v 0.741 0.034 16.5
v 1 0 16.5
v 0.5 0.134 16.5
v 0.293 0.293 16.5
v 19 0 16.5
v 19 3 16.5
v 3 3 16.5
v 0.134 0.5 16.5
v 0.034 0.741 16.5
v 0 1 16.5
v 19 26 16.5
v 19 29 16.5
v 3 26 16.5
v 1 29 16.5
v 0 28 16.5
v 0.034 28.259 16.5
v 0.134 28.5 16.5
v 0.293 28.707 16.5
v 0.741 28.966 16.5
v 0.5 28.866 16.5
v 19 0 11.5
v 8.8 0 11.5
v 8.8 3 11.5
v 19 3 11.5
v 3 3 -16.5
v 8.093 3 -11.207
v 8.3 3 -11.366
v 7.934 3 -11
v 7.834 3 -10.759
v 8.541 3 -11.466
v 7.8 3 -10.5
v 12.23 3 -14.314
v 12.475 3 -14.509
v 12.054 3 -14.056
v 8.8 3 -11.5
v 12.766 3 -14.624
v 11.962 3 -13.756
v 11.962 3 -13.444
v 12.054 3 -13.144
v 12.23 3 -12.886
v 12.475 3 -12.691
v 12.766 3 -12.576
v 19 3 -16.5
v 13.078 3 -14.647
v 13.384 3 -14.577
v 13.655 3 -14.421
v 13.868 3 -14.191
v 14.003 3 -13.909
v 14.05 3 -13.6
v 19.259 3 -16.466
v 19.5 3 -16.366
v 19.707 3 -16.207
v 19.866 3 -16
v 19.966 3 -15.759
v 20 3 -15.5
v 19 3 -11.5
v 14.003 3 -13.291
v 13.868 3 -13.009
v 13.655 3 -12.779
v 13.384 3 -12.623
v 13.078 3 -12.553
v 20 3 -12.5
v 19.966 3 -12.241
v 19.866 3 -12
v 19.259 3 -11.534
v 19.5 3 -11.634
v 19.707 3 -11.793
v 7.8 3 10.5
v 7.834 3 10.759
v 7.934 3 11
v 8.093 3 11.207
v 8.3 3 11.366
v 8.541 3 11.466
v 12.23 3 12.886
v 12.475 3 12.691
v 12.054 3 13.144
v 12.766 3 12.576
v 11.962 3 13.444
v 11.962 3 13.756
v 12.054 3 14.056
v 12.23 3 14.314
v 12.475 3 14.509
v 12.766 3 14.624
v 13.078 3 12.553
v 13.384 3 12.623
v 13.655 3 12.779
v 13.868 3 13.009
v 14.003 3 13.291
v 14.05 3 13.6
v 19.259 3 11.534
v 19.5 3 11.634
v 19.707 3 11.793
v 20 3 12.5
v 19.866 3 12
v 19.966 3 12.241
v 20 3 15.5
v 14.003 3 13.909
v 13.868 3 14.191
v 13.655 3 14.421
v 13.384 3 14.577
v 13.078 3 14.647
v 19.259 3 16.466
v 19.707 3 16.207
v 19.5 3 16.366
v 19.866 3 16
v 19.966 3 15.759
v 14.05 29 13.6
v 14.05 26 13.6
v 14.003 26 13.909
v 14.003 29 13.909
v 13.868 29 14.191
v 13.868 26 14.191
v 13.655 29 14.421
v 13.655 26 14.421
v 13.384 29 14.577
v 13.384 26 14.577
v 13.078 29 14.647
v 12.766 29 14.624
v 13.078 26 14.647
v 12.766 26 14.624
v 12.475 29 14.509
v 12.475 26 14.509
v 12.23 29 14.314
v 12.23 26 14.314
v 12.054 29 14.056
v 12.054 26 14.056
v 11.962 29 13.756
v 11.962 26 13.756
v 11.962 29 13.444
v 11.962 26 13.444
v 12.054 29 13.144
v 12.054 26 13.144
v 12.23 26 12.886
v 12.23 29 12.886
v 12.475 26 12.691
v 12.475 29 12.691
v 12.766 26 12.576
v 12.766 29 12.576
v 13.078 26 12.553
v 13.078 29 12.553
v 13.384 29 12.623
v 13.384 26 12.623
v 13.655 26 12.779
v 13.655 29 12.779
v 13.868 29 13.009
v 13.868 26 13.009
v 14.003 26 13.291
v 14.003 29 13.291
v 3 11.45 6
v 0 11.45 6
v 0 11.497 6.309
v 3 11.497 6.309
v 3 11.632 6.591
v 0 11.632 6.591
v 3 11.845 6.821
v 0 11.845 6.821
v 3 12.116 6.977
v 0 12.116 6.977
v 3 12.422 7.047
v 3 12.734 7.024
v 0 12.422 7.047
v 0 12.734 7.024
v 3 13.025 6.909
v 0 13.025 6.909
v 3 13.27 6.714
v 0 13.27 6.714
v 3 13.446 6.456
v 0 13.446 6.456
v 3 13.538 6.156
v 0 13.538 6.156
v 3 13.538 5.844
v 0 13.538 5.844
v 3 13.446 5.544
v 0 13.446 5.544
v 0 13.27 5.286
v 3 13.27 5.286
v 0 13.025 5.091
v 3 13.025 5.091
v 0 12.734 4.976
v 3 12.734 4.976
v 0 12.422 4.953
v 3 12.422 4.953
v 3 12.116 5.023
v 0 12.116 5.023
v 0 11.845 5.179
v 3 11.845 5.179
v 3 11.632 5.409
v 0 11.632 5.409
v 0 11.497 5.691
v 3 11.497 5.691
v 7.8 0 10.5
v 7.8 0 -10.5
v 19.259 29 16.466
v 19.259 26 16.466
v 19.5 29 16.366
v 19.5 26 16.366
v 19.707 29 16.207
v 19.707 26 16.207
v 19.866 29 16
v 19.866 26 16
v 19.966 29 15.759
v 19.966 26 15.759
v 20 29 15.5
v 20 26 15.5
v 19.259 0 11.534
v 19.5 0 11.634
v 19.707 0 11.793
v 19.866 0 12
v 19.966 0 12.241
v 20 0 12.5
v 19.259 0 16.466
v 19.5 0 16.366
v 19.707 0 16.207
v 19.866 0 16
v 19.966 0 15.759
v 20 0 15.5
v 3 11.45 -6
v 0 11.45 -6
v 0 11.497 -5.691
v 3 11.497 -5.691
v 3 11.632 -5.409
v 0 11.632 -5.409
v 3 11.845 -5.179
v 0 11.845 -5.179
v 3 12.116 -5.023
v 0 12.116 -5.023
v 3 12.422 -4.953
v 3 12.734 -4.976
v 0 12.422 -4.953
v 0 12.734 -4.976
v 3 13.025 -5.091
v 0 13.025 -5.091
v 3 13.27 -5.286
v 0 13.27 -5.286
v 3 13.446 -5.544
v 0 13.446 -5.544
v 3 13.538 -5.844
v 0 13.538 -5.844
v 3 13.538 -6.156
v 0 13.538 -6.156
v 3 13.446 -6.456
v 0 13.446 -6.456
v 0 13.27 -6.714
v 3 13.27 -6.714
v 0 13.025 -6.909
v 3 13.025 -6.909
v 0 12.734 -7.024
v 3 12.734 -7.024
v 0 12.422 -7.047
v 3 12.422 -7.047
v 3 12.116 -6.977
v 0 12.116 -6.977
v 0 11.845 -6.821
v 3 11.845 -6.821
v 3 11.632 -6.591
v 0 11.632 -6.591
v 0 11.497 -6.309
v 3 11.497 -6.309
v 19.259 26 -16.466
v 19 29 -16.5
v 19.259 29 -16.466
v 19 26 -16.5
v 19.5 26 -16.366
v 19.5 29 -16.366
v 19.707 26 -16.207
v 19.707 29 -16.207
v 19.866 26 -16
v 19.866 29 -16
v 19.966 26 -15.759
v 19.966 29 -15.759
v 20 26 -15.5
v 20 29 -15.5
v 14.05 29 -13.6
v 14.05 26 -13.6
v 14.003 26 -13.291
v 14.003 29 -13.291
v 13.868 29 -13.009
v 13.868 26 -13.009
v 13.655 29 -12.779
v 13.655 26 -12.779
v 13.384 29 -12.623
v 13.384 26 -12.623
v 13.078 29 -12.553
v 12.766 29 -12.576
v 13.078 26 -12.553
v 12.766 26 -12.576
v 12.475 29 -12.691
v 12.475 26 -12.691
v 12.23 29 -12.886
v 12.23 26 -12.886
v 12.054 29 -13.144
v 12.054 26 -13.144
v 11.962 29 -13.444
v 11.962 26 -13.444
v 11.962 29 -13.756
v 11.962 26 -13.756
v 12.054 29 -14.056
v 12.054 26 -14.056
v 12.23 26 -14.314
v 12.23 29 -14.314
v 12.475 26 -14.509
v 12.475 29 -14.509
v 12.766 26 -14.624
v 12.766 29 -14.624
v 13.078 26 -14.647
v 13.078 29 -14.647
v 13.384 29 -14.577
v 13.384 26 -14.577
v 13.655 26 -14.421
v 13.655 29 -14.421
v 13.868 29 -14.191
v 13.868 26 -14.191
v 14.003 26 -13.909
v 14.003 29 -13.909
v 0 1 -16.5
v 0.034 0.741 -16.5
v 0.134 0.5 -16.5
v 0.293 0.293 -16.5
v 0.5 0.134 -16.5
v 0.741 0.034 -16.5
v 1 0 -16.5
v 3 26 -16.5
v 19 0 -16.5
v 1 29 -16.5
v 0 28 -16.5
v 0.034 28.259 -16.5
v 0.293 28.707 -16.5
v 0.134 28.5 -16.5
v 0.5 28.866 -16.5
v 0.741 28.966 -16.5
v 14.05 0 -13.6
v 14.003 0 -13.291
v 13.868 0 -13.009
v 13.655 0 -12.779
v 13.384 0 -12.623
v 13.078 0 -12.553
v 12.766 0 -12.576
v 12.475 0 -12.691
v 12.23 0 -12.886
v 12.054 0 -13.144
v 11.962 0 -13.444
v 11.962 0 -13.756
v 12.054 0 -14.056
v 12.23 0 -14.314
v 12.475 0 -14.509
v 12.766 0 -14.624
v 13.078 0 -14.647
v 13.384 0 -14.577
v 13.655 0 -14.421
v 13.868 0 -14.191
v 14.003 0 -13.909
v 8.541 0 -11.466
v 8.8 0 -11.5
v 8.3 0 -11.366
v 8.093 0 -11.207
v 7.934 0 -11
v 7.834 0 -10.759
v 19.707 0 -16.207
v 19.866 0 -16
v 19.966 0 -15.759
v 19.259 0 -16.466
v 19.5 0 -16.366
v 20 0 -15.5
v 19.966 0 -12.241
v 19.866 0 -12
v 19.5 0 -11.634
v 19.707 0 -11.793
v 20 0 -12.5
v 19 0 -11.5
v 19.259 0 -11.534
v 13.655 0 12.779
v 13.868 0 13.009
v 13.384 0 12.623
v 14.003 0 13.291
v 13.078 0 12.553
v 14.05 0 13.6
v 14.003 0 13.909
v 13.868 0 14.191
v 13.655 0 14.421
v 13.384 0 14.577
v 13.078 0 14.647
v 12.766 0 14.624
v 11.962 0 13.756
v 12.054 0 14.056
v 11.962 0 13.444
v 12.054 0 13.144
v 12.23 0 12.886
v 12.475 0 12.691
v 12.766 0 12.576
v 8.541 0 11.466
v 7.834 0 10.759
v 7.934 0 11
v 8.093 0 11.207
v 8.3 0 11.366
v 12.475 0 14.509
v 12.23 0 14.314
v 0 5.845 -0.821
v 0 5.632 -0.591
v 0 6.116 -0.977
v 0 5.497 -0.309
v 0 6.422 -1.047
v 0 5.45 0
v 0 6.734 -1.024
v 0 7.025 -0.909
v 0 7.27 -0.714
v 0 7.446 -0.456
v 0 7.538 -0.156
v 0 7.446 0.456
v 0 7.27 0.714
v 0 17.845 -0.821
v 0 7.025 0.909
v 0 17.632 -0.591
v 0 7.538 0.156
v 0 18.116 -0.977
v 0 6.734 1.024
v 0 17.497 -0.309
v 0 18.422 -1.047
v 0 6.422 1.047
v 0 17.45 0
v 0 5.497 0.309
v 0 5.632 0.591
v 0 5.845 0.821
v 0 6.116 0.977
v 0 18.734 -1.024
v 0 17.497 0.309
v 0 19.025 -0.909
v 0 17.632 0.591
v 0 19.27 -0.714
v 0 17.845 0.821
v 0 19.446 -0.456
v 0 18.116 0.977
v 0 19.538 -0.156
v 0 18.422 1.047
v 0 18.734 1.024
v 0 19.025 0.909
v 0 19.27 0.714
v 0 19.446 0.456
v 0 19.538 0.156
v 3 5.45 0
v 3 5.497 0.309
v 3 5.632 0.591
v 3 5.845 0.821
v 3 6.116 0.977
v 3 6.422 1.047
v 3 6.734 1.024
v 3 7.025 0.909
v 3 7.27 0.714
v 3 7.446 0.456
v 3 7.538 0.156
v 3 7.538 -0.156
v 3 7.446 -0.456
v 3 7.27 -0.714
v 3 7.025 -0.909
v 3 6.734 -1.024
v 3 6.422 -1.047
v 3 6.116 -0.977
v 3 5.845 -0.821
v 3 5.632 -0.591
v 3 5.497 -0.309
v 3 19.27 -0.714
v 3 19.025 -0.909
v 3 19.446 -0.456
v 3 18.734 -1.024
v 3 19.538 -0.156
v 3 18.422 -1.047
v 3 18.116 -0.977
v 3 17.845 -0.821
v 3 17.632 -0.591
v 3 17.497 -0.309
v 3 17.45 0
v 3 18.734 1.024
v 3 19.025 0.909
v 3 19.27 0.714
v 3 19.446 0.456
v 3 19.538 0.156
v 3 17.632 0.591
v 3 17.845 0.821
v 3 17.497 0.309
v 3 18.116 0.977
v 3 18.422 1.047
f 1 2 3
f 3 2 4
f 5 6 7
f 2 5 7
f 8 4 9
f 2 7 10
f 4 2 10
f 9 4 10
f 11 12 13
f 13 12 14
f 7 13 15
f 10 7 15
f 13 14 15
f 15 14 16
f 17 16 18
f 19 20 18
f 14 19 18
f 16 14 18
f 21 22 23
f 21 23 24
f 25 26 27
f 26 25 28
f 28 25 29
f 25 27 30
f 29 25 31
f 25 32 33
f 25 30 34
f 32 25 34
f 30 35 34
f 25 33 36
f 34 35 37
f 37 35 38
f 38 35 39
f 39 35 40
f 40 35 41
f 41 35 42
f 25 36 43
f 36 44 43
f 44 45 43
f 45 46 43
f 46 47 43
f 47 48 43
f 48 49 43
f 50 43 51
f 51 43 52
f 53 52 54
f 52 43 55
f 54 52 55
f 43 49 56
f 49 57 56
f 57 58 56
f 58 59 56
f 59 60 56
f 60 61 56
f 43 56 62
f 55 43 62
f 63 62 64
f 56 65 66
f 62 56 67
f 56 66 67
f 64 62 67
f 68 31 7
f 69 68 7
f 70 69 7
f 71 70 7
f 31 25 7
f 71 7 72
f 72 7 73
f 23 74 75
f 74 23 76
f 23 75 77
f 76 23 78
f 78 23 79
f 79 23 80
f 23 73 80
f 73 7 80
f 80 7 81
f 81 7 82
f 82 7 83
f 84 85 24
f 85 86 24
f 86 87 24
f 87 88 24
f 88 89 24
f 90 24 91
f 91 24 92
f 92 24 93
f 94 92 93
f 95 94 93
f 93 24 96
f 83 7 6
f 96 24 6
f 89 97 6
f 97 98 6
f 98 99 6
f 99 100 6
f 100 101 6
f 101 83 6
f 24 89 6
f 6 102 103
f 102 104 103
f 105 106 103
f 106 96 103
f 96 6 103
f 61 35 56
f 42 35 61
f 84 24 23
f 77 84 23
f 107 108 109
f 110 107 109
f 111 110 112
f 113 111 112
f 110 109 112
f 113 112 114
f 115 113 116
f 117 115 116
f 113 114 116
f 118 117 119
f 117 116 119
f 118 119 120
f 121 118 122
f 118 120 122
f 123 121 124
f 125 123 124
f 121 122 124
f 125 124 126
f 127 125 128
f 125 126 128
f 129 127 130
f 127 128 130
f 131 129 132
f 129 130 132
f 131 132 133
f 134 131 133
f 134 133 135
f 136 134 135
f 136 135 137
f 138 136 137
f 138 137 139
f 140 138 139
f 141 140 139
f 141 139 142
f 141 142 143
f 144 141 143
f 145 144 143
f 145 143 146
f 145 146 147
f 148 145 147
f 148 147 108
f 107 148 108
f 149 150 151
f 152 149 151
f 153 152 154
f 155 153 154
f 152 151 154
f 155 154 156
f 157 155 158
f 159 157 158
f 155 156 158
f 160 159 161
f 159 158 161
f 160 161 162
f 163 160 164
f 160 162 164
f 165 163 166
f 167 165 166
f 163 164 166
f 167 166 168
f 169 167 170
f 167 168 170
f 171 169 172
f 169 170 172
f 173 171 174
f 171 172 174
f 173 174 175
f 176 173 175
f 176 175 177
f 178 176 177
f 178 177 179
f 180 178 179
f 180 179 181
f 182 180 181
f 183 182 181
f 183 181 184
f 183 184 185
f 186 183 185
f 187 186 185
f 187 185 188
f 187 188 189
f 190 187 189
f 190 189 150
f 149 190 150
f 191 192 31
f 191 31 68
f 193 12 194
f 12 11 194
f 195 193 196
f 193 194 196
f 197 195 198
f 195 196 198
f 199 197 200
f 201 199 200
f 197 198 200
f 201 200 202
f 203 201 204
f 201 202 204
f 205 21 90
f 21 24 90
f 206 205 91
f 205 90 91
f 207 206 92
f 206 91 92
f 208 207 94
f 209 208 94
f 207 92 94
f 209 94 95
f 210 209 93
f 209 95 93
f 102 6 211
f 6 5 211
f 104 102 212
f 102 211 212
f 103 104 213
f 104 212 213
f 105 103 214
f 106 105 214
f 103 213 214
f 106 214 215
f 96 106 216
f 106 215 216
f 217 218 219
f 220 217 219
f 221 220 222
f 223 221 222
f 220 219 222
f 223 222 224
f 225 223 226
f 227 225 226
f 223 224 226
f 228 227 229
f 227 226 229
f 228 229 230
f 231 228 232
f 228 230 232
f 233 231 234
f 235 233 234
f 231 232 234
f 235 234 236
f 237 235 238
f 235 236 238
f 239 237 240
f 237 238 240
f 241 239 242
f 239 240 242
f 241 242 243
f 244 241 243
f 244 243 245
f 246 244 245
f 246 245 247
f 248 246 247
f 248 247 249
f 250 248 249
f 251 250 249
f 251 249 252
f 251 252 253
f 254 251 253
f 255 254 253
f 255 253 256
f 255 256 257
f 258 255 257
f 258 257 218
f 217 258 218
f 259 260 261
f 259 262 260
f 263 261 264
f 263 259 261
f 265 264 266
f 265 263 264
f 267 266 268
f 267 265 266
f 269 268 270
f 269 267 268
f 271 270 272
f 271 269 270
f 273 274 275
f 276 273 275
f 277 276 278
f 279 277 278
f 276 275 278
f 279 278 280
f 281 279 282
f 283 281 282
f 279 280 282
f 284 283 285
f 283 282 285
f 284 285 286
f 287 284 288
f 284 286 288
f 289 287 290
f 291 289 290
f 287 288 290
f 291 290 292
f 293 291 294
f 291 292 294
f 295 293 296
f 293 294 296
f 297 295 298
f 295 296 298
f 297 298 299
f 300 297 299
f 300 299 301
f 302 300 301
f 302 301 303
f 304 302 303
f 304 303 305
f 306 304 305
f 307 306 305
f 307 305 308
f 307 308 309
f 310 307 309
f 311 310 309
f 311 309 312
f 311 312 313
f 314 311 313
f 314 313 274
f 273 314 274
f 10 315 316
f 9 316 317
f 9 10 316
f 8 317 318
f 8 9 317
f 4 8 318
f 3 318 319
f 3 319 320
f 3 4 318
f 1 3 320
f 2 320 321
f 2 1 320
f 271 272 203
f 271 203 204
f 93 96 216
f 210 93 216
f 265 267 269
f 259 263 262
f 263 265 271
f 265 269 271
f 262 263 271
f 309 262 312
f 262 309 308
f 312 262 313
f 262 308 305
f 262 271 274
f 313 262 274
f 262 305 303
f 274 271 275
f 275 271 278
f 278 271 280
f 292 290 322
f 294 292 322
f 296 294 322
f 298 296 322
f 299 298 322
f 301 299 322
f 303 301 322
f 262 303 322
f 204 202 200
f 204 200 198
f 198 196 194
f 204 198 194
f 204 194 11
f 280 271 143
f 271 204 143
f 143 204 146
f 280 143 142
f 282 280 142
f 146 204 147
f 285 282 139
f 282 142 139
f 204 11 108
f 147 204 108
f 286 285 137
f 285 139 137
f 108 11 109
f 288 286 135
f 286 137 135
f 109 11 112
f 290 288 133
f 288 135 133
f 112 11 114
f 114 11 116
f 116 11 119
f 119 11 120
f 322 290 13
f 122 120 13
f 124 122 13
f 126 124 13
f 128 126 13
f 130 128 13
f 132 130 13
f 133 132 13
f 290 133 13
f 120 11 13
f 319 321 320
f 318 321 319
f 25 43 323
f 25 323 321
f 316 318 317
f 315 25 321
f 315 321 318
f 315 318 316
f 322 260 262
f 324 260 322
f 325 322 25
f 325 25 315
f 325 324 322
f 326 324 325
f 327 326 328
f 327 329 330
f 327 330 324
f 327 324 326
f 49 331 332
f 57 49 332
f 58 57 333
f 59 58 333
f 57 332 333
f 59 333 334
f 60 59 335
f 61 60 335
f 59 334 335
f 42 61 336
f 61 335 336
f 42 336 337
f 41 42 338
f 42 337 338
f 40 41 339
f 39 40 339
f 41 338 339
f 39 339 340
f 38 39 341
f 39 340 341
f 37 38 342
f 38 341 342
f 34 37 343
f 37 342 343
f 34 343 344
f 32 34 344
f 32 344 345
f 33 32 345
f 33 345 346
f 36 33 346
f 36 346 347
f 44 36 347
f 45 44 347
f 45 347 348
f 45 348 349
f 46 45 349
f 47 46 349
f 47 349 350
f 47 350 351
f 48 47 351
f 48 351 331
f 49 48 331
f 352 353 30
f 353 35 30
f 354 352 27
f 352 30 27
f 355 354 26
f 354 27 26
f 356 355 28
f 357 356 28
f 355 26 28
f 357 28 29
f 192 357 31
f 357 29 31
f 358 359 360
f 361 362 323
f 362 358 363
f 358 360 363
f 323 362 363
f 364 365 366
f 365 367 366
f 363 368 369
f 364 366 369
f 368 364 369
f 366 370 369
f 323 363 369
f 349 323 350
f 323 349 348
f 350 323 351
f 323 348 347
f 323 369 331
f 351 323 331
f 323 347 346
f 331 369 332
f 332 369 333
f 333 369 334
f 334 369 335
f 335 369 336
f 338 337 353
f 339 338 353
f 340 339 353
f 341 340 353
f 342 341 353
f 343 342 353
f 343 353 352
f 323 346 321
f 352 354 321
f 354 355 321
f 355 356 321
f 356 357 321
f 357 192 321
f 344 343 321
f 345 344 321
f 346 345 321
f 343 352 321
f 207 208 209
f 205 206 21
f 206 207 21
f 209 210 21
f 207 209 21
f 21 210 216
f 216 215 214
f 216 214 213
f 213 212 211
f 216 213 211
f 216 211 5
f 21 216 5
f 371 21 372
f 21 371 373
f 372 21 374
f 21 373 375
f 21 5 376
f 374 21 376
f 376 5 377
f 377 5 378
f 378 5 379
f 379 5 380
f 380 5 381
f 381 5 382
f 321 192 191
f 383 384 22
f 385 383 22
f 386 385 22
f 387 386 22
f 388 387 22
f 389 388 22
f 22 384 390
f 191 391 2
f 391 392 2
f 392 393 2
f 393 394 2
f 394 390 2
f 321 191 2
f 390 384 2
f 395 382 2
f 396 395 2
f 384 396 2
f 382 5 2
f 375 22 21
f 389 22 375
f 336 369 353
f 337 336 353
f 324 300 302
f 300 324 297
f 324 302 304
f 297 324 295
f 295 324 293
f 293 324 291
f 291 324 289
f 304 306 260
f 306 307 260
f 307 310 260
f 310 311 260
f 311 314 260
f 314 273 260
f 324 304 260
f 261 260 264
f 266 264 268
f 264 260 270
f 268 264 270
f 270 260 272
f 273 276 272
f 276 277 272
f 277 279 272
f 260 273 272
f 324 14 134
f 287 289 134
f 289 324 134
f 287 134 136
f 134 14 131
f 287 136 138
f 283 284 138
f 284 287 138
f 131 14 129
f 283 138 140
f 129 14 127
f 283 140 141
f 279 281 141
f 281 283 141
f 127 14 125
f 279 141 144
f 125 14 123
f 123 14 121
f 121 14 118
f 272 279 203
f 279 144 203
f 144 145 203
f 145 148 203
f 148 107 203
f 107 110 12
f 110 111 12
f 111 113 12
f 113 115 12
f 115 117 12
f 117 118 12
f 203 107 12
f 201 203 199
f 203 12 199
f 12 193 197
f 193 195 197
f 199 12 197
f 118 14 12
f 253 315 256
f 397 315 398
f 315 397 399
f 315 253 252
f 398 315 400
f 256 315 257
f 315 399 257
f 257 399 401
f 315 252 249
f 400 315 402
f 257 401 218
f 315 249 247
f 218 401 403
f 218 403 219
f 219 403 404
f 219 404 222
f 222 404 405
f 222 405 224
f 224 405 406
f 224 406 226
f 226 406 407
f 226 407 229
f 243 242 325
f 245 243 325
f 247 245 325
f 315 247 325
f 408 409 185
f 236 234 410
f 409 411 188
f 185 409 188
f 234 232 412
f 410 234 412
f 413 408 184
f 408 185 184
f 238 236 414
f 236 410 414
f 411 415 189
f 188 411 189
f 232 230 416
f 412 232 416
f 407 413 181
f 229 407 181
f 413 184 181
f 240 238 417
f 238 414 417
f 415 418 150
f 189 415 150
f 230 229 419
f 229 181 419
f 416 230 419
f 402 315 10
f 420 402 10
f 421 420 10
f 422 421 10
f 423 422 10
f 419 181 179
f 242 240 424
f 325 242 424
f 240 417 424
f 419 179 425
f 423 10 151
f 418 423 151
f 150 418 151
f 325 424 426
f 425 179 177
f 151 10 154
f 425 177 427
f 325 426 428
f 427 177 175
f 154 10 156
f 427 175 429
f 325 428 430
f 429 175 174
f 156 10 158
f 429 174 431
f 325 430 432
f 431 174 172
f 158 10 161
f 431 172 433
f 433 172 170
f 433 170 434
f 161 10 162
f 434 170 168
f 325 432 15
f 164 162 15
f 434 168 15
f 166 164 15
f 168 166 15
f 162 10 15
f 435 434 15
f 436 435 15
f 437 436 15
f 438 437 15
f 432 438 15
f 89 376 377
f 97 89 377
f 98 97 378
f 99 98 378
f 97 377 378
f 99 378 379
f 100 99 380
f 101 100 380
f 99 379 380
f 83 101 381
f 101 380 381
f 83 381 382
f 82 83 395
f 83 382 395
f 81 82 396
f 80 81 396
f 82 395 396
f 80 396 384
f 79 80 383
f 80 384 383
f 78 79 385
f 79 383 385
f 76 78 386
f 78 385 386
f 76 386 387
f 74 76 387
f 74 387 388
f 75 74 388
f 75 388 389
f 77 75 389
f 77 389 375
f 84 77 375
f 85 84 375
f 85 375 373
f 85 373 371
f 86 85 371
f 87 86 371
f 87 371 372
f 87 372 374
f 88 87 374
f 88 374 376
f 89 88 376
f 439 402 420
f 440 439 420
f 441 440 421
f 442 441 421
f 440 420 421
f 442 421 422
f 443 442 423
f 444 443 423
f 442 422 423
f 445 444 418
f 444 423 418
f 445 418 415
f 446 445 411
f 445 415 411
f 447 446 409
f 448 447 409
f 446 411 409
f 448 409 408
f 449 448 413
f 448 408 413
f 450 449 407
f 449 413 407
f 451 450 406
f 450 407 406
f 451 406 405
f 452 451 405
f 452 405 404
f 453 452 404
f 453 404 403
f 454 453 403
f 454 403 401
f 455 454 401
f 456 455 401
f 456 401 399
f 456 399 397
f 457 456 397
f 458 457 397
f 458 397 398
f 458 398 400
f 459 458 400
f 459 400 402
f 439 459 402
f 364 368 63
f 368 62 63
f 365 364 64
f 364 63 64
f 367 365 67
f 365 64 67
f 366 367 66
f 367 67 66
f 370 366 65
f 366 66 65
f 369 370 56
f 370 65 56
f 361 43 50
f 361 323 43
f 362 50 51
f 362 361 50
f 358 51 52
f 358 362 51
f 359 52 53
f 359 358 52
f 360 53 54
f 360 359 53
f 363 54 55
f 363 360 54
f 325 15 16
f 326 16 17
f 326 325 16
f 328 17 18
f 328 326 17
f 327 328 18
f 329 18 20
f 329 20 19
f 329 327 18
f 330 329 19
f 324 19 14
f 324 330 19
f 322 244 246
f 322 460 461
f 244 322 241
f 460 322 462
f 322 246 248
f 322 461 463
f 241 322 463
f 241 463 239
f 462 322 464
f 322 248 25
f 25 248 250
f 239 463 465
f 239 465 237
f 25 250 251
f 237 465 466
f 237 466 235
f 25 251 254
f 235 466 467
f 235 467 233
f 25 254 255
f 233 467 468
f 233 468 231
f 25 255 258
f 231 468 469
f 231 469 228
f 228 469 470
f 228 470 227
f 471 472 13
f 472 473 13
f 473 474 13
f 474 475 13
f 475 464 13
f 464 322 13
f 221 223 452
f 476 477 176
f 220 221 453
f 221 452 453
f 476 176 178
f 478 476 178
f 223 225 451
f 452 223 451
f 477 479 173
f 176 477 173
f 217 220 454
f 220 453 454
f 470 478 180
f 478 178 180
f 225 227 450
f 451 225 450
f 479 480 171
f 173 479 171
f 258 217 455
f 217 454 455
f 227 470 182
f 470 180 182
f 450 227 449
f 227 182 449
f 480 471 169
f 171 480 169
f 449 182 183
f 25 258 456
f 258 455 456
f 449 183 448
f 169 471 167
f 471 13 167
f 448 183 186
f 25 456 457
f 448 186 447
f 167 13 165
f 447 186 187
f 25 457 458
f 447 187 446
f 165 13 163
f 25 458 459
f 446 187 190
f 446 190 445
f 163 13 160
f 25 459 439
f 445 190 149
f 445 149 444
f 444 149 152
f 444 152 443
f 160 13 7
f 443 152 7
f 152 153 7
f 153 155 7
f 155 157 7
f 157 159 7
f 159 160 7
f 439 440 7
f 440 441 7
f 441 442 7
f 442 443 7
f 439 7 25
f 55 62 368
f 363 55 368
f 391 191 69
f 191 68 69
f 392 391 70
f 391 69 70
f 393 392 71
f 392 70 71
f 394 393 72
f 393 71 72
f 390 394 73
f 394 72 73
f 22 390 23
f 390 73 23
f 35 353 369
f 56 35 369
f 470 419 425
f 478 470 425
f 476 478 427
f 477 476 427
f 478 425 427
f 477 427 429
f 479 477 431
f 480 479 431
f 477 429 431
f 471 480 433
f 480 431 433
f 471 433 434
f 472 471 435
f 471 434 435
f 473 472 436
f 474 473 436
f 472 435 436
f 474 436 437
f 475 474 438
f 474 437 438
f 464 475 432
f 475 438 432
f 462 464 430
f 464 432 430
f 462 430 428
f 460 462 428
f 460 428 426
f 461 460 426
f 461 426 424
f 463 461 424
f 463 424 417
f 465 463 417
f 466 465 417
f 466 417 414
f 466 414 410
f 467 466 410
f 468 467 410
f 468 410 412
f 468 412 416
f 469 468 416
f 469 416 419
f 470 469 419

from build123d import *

# Parameters (mm, degrees)
PAD_DEPTH       = 16.5
SKETCH001_R     = 1.05
POCKET_DEPTH    = 33
SKETCH002_W     = 12.2
SKETCH002_H     = 23
POCKET001_DEPTH = 5
SKETCH003_R     = 1.05
POCKET002_DEPTH = 5
FILLET_R        = 1


with BuildPart() as part:
    # Sketch → Pad (new body, symmetric)
    with BuildSketch(Plane.XY):
        Polygon((0, 0), (0, 29), (20, 29), (20, 26), (3, 26), (3, 3), (20, 3), (20, 0), align=None)
    extrude(amount=PAD_DEPTH, both=True)

    # Sketch001 → Pocket (cut)
    with BuildSketch(Plane.XZ):
        with Locations((13, 13.6)):
            Circle(SKETCH001_R)
        with Locations((13, -13.6)):
            Circle(SKETCH001_R)
    extrude(amount=-POCKET_DEPTH, mode=Mode.SUBTRACT)

    # Sketch002 (on Face2 of Pocket) → Pocket001 (cut)
    with BuildSketch(Plane.XZ):
        with Locations((13.9, 0)):
            Rectangle(SKETCH002_W, SKETCH002_H)
    extrude(amount=-POCKET001_DEPTH, mode=Mode.SUBTRACT)

    # Sketch003 (on Face1 of Pocket001) → Pocket002 (cut)
    with BuildSketch(Plane(origin=(0, 0, 0), x_dir=(0, -1, 0), z_dir=(-1, 0, 0))):
        with Locations((-12.5, 6)):
            Circle(SKETCH003_R)
        with Locations((-12.5, -6)):
            Circle(SKETCH003_R)
        with Locations((-6.5, 0)):
            Circle(SKETCH003_R)
        with Locations((-18.5, 0)):
            Circle(SKETCH003_R)
    extrude(amount=-POCKET002_DEPTH, mode=Mode.SUBTRACT)

    # Fillet
    fillet_edges = [part.edges().sort_by_distance(p)[0] for p in [
        (20, 27.5, 16.5),
        (20, 27.5, -16.5),
        (20, 1.5, 16.5),
        (20, 1.5, -16.5),
        (0, 0, 0),
        (0, 29, 0),
        (20, 1.5, -11.5),
        (20, 1.5, 11.5),
        (7.8, 1.5, -11.5),
        (7.8, 1.5, 11.5),
    ]]
    fillet(fillet_edges, radius=FILLET_R)


solid = part.part
